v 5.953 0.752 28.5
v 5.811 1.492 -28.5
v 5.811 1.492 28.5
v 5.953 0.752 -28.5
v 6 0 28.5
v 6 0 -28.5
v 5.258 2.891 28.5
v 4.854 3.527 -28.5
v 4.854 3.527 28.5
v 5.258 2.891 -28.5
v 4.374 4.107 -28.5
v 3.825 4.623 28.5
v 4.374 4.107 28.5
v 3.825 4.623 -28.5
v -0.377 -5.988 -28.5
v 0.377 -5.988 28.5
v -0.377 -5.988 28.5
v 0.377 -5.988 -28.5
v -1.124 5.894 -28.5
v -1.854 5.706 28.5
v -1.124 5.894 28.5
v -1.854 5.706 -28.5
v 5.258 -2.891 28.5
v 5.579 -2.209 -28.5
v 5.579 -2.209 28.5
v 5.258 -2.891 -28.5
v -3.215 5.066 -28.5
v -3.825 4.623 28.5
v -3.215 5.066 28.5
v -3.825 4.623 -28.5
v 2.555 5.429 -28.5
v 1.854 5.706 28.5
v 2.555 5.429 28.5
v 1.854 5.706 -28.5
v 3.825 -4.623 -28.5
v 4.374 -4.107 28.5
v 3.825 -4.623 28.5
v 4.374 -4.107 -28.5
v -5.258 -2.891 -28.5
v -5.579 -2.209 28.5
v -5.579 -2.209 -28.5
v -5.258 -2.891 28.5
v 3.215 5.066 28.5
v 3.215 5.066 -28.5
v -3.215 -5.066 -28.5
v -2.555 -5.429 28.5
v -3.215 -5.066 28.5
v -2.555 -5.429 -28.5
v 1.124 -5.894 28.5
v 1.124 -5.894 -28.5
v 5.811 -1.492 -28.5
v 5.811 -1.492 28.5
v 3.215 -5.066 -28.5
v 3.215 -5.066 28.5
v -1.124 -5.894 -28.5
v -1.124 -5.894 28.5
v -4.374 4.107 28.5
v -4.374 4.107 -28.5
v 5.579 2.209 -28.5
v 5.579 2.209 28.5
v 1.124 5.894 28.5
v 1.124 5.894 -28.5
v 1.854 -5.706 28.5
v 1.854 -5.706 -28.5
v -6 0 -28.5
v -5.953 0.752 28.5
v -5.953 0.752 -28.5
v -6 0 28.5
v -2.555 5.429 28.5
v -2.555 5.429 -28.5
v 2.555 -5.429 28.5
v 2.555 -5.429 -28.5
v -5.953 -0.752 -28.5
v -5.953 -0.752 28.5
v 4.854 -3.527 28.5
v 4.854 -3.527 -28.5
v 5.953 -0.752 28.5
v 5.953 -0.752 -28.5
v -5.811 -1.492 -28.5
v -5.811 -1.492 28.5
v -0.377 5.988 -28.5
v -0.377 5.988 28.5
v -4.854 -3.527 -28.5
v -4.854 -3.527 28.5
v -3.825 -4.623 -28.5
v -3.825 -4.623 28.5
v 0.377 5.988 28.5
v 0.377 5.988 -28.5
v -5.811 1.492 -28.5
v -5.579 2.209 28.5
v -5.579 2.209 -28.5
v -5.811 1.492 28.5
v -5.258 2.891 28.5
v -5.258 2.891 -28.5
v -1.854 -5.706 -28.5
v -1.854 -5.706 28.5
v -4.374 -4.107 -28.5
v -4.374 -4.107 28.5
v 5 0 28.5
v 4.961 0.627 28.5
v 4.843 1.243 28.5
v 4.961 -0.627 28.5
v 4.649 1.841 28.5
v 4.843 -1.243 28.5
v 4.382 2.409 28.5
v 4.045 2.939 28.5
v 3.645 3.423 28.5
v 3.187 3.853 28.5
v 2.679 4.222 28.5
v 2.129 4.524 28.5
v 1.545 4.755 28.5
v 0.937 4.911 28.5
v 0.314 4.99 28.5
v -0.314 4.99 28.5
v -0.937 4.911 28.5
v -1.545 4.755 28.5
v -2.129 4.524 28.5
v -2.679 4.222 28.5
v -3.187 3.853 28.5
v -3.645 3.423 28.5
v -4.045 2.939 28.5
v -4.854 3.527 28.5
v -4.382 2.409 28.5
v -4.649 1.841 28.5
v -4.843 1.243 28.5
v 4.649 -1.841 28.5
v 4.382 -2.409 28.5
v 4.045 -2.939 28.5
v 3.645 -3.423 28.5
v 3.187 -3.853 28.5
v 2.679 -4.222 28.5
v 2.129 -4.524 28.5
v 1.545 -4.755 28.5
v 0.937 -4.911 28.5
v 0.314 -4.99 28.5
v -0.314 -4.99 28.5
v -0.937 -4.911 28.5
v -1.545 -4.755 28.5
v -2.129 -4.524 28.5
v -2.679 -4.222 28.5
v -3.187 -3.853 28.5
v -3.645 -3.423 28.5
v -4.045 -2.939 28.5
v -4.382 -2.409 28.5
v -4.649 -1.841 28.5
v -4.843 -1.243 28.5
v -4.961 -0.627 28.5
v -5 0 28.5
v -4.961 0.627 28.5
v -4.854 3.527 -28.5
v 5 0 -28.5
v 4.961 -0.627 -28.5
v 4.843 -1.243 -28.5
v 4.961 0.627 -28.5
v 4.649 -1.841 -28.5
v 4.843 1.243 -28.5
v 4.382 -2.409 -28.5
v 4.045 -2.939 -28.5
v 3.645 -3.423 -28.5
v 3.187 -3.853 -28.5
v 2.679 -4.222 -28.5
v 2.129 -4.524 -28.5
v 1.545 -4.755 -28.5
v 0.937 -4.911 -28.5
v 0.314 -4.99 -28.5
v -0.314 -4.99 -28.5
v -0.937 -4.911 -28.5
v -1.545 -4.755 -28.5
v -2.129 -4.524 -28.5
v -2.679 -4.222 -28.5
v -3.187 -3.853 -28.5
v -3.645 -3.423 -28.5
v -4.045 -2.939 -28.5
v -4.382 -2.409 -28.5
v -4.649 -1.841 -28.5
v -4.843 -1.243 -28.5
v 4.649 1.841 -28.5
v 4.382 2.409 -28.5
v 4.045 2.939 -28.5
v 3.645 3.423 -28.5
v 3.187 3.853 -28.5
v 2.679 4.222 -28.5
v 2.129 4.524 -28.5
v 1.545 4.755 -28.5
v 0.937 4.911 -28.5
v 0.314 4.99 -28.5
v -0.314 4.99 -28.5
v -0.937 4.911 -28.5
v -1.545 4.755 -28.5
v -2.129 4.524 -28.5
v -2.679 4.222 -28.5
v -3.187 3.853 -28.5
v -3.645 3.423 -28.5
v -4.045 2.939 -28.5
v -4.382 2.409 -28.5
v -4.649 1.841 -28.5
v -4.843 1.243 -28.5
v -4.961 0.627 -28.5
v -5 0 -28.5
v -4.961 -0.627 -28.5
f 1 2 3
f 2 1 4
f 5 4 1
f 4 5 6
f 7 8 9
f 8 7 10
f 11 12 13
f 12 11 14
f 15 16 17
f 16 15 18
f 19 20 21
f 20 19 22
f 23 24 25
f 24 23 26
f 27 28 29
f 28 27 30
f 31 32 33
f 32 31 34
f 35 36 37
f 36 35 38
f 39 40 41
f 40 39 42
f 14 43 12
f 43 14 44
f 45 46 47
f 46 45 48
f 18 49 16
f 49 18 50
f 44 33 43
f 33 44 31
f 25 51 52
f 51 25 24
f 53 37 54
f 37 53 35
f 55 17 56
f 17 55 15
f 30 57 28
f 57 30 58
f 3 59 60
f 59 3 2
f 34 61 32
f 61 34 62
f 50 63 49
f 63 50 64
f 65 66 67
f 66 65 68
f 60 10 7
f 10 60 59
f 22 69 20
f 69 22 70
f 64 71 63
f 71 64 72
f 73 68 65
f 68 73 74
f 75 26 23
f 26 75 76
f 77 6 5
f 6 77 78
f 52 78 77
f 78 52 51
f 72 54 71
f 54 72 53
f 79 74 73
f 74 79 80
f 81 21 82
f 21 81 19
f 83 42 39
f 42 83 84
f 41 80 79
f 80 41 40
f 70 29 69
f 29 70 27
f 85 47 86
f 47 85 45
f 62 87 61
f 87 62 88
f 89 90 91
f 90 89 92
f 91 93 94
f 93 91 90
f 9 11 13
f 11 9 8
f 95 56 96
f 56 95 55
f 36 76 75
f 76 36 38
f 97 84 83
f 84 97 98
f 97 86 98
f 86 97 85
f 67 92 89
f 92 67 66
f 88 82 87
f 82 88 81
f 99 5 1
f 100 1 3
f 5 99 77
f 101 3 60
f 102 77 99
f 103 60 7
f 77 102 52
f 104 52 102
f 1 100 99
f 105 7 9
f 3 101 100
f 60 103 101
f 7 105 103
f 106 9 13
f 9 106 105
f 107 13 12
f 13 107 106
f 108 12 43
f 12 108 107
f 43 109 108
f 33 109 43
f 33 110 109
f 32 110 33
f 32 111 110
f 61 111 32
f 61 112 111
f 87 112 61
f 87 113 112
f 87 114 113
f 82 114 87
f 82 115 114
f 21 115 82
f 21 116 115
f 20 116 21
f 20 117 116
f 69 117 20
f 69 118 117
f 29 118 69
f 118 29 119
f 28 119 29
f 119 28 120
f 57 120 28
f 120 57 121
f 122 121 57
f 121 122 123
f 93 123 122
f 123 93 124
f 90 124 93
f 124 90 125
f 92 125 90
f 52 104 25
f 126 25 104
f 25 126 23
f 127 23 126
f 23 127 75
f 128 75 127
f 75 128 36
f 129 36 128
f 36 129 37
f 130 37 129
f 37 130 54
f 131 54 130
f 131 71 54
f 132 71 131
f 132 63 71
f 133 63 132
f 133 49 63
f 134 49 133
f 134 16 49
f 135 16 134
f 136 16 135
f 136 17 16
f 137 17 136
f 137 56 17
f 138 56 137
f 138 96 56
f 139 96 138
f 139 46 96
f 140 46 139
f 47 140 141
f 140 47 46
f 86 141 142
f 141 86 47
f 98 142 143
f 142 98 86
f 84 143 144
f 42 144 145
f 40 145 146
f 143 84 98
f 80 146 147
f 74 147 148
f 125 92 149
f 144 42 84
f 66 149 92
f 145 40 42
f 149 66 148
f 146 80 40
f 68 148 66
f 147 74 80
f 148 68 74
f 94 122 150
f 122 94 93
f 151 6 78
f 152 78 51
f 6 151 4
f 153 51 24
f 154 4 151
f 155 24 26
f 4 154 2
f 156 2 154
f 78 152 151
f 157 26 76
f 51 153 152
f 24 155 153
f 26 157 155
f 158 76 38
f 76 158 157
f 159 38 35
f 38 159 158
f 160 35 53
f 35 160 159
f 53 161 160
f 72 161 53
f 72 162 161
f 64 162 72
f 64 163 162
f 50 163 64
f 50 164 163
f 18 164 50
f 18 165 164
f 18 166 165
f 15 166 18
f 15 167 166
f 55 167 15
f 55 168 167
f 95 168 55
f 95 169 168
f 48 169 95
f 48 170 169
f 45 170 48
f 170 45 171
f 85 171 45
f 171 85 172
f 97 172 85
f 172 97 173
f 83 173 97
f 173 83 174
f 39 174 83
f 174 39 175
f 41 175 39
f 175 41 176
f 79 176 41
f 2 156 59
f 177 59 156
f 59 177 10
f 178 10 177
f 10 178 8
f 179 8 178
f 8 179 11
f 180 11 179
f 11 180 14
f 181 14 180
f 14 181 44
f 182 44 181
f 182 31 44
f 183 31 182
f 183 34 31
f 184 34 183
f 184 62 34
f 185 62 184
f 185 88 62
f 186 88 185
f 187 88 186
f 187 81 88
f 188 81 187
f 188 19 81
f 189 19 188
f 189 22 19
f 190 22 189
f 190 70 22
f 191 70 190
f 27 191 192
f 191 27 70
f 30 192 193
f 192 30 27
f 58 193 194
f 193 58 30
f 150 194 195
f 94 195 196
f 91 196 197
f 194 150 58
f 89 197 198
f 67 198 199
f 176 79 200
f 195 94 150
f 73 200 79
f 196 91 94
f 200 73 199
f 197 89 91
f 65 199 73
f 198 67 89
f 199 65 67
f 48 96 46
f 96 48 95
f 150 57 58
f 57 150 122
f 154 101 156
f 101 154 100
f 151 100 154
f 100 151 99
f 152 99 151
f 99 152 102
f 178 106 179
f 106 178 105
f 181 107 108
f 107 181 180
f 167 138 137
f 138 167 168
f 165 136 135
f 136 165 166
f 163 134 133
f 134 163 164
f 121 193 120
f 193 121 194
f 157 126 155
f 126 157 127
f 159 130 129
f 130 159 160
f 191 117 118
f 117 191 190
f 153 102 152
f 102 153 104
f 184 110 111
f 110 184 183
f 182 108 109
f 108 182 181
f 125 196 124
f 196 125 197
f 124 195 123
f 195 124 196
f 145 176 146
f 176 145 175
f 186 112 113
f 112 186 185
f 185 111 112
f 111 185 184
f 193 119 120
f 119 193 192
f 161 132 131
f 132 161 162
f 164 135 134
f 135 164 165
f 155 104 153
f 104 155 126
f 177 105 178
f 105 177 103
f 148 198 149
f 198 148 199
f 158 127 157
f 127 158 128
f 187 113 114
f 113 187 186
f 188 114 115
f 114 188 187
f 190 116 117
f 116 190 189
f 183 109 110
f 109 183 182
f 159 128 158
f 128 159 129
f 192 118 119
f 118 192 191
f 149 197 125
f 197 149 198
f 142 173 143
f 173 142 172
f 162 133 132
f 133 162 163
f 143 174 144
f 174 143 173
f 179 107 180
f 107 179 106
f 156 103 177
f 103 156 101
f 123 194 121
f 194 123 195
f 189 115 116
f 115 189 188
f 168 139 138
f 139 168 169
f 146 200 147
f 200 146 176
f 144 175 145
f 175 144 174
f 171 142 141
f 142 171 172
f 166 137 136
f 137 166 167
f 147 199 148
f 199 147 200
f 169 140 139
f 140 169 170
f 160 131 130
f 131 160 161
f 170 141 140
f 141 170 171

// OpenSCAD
$fn = 50;


difference() {
	union() {
		translate(v = [0, 0, -28.5000000000]) {
			cylinder(h = 57, r = 6.0000000000);
		}
	}
	union() {
		translate(v = [0, 0, -100.0000000000]) {
			cylinder(h = 200, r = 5.0000000000);
		}
	}
}
